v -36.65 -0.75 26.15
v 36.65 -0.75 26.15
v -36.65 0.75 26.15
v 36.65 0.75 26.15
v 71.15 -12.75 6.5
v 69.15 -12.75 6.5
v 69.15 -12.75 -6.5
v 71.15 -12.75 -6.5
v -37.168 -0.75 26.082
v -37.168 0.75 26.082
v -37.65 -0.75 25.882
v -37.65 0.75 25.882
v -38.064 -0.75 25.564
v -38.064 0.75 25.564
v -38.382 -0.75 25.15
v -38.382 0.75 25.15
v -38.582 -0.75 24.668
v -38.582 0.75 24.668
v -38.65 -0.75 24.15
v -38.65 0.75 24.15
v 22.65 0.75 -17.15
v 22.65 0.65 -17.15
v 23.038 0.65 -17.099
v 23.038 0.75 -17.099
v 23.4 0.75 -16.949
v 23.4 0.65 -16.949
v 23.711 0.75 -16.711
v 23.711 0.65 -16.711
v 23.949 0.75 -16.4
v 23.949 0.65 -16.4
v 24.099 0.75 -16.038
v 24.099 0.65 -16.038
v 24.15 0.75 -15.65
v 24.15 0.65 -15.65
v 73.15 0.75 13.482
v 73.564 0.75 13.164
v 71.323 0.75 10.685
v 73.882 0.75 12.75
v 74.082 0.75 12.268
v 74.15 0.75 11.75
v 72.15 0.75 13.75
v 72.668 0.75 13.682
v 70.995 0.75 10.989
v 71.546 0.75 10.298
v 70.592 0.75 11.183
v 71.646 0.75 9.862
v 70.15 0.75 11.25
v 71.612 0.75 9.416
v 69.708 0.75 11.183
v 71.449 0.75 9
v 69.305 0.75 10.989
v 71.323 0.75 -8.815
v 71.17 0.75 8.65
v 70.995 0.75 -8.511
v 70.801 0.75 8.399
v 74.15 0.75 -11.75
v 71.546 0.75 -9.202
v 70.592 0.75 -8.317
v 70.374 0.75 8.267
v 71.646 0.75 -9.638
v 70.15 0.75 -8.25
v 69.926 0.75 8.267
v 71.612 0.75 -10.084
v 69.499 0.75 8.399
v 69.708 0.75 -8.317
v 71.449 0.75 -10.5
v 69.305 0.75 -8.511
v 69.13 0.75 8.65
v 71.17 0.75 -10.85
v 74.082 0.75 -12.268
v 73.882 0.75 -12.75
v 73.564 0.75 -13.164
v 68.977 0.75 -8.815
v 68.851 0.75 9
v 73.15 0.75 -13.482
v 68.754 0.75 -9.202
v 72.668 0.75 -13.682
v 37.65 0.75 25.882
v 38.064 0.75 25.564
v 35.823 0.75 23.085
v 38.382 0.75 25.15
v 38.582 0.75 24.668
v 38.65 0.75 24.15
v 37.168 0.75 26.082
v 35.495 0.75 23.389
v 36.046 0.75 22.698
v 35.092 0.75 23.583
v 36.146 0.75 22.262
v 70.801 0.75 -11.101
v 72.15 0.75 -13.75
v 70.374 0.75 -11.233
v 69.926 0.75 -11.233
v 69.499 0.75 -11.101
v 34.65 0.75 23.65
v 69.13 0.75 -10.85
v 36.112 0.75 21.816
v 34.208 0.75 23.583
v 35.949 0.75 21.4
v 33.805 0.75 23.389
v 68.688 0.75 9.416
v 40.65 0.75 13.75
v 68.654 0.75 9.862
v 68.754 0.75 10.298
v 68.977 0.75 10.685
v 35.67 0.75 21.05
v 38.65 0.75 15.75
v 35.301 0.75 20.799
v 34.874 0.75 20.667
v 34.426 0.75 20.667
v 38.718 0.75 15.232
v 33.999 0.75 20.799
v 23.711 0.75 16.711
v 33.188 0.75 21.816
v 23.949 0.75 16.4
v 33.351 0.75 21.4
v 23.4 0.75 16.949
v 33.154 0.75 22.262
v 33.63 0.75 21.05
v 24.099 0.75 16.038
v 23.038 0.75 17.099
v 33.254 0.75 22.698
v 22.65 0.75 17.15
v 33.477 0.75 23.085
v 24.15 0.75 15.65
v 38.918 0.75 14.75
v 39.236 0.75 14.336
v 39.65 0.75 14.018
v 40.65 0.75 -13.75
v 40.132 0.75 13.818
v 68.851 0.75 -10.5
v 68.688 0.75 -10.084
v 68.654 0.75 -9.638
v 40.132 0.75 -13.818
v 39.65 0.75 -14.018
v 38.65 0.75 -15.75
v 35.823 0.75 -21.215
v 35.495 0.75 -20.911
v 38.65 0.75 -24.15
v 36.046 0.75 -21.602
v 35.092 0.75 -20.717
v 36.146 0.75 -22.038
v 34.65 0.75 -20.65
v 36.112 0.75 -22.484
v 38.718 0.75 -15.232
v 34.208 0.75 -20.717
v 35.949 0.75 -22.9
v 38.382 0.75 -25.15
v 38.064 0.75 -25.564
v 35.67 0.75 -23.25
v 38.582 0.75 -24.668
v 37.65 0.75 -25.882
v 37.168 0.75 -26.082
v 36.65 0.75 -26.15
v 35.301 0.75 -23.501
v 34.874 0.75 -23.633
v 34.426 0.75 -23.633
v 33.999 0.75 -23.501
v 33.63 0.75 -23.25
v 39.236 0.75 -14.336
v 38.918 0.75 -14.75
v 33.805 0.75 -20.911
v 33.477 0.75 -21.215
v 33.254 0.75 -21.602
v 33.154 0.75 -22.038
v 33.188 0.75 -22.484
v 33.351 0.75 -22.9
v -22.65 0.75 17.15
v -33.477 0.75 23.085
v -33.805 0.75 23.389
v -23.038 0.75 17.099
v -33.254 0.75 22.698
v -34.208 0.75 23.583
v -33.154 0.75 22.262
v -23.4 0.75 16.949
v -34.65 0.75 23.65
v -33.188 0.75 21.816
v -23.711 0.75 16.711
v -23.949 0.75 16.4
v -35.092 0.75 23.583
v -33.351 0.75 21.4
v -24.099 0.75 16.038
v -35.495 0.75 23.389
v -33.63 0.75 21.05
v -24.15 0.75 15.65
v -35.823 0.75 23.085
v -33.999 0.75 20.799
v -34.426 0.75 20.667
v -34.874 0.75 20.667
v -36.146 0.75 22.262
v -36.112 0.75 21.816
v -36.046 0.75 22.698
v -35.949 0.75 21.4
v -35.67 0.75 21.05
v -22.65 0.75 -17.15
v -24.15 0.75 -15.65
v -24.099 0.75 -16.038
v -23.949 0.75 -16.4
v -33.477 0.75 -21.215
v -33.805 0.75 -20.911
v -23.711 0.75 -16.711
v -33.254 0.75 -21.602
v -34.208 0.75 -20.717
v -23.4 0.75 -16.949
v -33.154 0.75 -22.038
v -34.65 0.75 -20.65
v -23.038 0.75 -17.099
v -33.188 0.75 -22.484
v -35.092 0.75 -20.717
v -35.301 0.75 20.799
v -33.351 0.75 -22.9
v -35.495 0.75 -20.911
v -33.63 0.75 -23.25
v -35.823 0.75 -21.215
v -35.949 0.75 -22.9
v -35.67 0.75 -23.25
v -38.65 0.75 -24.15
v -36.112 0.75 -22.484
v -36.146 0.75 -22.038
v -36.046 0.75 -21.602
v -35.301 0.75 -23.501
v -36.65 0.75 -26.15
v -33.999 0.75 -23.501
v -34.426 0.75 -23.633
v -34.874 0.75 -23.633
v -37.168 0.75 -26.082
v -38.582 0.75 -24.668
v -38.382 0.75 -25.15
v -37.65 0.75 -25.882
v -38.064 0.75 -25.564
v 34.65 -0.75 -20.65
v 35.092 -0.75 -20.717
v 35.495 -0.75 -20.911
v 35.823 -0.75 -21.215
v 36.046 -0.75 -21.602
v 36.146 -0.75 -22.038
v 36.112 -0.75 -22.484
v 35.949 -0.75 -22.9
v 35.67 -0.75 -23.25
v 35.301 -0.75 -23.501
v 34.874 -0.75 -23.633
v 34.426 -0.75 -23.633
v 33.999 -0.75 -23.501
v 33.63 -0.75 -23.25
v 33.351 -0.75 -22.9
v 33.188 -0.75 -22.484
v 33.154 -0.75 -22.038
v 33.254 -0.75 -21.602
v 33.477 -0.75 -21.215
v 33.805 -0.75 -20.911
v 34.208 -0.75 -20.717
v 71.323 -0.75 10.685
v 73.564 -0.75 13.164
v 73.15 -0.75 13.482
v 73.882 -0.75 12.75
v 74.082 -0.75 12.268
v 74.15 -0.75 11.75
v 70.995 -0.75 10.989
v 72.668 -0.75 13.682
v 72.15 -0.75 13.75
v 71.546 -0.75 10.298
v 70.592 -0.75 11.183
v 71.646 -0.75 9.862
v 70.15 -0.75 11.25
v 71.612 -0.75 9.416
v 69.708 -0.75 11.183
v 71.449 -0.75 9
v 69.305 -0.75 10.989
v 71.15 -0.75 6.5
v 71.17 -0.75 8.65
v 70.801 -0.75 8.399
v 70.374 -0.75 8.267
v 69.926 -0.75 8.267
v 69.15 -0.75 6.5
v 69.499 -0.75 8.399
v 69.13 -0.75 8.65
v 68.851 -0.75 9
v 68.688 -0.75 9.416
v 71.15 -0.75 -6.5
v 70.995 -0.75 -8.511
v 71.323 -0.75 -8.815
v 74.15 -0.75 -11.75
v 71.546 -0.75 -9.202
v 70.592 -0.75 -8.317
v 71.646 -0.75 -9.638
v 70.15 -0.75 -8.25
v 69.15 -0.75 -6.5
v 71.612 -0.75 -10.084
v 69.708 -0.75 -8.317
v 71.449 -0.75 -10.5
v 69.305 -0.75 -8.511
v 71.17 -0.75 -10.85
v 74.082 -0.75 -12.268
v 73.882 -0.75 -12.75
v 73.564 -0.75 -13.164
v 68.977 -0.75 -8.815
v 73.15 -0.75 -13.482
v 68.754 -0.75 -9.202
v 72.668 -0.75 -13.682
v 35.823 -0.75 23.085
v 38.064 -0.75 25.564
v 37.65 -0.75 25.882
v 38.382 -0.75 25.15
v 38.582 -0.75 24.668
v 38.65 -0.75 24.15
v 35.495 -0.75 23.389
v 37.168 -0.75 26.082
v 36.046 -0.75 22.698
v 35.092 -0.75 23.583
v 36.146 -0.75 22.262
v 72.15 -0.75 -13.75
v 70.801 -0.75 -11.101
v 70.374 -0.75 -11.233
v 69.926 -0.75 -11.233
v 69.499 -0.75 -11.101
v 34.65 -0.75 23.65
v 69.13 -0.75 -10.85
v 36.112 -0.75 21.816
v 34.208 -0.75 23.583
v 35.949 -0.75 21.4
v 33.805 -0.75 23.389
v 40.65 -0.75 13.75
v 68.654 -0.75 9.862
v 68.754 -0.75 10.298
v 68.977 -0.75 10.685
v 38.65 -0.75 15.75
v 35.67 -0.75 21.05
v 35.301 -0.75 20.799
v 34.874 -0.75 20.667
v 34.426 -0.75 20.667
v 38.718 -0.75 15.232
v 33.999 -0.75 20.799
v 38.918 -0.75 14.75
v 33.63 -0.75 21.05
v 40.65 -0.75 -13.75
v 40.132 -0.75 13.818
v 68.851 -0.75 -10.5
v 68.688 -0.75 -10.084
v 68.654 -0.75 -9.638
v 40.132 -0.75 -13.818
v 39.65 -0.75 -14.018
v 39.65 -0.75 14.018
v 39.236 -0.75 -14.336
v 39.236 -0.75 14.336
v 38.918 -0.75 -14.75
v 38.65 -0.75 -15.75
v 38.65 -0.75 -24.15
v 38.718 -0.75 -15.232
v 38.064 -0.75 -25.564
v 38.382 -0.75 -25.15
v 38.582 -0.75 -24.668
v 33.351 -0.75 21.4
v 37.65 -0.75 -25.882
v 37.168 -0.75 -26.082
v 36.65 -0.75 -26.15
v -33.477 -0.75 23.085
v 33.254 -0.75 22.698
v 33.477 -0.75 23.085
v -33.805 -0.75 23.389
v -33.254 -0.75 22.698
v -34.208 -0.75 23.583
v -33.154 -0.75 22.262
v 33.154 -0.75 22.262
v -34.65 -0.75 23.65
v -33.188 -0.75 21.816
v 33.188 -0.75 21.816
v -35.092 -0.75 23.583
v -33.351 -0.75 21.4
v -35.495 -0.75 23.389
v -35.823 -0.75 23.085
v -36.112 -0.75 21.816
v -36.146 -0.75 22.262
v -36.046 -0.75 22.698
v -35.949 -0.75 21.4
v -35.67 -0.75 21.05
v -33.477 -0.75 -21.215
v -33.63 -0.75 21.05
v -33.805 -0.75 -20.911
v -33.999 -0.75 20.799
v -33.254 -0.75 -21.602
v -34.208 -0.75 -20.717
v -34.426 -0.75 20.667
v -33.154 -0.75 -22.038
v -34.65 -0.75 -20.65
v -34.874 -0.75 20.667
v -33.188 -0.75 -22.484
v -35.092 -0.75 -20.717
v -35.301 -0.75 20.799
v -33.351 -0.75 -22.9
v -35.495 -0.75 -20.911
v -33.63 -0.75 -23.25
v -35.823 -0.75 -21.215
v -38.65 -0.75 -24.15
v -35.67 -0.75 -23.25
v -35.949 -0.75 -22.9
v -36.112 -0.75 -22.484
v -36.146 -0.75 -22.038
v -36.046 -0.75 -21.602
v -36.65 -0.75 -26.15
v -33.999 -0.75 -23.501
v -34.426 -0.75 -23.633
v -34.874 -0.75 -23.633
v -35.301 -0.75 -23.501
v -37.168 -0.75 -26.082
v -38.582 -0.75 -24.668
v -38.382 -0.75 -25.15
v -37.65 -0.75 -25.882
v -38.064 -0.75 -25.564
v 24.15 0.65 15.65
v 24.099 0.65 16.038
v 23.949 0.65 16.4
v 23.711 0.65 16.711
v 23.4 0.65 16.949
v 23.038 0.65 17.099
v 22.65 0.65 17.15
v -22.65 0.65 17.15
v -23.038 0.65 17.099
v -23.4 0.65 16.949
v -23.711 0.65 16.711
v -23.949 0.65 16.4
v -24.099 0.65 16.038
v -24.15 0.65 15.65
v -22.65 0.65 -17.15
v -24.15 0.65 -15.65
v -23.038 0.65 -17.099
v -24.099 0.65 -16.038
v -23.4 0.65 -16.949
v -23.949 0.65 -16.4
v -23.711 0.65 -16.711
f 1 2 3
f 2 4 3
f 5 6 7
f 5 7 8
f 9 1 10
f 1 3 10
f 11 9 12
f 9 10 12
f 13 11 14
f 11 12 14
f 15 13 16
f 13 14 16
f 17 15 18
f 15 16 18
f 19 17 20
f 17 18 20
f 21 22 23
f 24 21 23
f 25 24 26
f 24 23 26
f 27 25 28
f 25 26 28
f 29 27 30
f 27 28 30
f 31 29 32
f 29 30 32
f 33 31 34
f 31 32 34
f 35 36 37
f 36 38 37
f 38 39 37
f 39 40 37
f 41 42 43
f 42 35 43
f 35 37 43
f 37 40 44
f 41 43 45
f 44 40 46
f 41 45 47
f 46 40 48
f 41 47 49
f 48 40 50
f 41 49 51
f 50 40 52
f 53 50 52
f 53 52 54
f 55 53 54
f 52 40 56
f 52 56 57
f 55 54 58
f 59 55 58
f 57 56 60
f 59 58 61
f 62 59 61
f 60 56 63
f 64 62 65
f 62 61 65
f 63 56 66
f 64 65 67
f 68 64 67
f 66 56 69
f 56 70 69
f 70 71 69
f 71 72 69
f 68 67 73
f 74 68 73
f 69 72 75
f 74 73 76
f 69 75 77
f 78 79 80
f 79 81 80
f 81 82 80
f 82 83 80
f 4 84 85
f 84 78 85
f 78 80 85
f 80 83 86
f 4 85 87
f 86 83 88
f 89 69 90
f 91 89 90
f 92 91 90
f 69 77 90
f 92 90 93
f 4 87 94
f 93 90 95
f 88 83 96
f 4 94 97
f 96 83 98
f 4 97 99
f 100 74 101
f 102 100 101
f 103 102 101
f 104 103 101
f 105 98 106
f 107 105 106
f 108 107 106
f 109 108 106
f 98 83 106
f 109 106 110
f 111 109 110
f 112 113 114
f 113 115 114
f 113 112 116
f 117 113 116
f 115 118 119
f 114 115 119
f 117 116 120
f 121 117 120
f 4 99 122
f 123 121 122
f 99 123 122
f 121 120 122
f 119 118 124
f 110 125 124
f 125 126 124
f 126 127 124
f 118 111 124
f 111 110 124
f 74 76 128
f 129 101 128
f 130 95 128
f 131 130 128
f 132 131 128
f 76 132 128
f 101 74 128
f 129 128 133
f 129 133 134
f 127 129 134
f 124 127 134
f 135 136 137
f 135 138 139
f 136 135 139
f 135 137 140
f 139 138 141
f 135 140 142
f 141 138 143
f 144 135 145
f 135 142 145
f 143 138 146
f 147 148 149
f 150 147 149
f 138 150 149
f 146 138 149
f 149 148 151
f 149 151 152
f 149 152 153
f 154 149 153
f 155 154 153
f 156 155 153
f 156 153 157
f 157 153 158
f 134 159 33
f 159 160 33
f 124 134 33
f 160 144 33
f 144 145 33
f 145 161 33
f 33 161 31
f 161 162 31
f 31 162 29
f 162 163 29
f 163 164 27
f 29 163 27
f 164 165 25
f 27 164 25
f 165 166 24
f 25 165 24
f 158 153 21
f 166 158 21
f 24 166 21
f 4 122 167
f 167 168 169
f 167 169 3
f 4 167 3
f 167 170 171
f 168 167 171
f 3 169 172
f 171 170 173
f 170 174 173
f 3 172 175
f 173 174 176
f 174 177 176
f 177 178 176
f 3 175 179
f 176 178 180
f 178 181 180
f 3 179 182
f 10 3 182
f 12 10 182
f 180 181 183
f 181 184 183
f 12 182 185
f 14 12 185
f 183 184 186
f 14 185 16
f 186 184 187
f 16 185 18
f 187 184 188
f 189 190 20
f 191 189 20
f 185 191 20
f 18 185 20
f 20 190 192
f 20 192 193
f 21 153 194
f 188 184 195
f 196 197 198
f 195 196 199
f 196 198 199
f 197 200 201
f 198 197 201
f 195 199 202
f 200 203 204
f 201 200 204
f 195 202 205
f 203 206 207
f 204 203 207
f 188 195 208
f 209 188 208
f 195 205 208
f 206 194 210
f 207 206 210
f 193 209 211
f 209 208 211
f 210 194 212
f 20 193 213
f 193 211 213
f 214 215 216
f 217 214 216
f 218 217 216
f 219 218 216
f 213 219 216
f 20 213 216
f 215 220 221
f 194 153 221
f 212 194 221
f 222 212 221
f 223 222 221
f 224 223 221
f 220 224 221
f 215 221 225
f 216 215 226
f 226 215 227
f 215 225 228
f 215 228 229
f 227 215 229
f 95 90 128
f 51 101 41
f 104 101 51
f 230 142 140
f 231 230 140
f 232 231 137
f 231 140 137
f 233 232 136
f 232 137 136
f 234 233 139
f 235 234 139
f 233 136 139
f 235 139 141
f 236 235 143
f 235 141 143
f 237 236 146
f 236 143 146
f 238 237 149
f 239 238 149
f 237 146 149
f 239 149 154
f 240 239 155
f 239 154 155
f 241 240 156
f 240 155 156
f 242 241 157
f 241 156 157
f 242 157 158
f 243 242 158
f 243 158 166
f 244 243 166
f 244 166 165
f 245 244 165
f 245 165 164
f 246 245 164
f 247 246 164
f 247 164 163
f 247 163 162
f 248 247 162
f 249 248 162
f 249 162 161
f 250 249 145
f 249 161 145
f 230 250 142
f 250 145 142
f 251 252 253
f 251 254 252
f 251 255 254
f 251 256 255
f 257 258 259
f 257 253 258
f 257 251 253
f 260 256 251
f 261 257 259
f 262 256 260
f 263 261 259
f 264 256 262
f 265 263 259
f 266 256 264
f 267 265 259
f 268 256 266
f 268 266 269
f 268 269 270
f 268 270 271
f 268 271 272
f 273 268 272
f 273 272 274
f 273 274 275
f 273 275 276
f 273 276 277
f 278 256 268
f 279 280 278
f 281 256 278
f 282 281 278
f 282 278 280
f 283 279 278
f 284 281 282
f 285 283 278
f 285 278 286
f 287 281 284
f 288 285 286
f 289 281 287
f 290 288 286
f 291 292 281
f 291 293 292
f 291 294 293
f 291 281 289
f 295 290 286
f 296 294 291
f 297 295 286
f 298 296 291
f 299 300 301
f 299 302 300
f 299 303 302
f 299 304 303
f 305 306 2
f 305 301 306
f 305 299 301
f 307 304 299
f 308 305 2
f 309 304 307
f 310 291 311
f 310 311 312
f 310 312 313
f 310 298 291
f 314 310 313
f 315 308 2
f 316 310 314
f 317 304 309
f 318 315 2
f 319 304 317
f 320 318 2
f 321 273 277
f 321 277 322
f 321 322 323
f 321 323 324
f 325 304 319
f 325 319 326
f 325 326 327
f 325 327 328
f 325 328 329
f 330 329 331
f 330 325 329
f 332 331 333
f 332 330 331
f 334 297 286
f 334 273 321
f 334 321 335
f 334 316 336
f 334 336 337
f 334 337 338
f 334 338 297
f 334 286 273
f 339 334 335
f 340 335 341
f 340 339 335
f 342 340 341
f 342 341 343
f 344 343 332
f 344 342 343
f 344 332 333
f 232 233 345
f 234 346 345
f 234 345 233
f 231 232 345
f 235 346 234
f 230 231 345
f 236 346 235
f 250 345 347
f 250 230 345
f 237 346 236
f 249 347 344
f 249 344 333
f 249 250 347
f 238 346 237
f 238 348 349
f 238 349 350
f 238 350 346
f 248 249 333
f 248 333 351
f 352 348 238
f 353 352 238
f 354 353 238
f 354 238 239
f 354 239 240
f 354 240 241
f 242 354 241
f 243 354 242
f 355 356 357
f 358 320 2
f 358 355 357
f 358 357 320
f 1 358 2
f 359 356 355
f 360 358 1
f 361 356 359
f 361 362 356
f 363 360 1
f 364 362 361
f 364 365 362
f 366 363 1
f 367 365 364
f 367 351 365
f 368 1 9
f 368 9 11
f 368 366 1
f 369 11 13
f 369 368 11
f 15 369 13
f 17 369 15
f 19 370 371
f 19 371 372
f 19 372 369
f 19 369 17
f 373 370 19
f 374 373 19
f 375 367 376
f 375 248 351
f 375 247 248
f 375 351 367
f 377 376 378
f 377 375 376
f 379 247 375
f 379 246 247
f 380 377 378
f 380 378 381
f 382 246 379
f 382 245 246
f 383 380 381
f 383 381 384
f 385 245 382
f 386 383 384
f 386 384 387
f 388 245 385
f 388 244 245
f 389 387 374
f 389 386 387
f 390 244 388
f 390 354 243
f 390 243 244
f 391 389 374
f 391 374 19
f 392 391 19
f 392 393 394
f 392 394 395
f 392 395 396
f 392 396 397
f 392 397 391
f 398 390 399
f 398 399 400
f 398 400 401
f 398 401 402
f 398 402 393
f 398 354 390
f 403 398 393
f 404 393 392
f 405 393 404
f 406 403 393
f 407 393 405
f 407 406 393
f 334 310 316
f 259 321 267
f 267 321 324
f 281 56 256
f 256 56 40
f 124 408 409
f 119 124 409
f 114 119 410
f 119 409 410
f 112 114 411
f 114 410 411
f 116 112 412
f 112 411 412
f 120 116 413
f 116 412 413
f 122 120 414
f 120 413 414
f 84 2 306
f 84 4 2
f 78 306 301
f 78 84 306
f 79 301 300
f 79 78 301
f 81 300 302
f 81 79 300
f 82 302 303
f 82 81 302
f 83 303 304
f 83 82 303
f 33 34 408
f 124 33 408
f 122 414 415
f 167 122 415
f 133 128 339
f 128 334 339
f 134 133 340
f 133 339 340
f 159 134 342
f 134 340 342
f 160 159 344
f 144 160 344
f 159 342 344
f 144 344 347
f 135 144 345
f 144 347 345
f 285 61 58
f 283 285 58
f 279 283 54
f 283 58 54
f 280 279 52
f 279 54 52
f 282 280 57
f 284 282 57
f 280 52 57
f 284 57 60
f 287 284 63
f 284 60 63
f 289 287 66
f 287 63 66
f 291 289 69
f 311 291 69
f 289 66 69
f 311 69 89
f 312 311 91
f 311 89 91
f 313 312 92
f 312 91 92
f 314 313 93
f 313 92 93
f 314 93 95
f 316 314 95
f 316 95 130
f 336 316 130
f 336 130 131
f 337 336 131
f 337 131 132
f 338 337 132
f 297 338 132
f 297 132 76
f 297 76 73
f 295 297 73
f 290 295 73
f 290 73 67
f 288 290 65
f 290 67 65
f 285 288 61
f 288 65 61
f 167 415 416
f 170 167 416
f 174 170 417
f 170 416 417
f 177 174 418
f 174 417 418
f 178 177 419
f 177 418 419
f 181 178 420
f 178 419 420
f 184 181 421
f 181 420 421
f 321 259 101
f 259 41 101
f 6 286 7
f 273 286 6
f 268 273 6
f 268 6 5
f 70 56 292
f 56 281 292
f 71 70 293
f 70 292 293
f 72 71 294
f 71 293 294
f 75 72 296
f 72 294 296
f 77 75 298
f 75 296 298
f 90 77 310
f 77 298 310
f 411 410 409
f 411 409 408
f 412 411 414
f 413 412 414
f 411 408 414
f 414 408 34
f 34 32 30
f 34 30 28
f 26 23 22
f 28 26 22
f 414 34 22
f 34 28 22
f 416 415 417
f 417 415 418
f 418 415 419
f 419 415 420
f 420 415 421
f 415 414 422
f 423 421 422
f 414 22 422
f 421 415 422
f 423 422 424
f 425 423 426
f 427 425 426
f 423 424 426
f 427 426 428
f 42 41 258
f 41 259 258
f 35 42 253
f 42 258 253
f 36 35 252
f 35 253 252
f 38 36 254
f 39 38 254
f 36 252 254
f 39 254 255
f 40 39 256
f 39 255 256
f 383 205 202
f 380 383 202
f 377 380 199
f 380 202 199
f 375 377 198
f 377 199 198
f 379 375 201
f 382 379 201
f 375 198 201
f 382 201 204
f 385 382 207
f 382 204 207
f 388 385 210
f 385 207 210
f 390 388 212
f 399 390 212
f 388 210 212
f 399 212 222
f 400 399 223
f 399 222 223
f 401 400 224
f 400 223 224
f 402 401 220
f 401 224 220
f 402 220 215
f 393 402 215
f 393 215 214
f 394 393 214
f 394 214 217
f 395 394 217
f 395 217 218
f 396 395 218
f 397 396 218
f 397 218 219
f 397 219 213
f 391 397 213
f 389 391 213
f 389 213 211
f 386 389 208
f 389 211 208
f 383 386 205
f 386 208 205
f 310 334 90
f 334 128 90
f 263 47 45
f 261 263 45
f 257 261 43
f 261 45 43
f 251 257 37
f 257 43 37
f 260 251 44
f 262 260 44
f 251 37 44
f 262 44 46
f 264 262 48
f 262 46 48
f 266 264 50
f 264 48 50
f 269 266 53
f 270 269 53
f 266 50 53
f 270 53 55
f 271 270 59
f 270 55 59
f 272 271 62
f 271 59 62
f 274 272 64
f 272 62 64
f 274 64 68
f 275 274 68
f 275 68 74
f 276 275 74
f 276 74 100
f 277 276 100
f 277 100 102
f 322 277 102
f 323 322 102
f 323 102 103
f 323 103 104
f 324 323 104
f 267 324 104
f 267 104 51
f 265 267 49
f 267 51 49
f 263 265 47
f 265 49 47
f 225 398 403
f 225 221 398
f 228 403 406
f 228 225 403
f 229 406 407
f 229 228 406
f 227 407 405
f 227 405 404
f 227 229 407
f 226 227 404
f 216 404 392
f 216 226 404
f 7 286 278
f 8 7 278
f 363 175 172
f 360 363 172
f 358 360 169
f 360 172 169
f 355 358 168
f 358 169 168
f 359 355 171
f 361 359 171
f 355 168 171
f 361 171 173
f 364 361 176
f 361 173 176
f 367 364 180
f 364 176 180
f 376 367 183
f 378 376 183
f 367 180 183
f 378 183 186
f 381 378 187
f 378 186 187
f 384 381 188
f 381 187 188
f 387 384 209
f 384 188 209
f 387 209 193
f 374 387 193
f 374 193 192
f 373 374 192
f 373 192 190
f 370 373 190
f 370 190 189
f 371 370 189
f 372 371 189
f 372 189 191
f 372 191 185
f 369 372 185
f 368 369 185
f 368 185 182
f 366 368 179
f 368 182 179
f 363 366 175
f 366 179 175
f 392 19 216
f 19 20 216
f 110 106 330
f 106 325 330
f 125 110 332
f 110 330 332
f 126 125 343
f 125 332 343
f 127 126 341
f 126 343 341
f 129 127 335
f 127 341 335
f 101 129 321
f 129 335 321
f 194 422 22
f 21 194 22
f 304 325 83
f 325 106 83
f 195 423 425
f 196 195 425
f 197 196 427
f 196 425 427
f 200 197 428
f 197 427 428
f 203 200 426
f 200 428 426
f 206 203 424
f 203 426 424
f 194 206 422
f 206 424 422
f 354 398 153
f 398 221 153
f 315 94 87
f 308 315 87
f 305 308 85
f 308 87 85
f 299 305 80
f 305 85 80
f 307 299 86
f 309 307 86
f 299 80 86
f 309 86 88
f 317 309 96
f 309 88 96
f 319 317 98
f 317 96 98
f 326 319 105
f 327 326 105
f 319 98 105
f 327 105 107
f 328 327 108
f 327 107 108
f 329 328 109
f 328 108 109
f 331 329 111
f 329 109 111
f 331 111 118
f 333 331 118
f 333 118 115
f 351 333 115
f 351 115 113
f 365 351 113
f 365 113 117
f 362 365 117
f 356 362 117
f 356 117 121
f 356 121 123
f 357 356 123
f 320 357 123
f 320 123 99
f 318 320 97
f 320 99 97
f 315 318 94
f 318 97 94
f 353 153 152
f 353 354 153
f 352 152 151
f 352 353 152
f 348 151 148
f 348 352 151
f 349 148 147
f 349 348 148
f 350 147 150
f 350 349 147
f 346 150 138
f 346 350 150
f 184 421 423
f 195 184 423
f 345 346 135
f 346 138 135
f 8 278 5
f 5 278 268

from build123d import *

# Parameters (mm, degrees)
BOSS_EXTRUDE1_DEPTH     = 0.75
FILLET1_R               = 2
SKETCH2_R               = 1.5
CUT_EXTRUDE1_DEPTH      = 1.5
CUT_EXTRUDE2_DEPTH      = 0.1
CUT_EXTRUDE2_DEPTH_BACK = 0.1
SKETCH5_W               = 2
SKETCH5_H               = 13
BOSS_EXTRUDE2_DEPTH     = 12


with BuildPart() as part:
    # Sketch1 → Boss-Extrude1 (new, symmetric)
    with BuildSketch(Plane(origin=(0, 0, 0), x_dir=(1, 0, 0), z_dir=(0, 1, 0))):
        Polygon((-38.65, 26.15), (38.65, 26.15), (38.65, 13.75), (74.15, 13.75), (74.15, -13.75), (38.65, -13.75), (38.65, -26.15), (-38.65, -26.15), align=None)
    extrude(amount=BOSS_EXTRUDE1_DEPTH, both=True)

    # Fillet1
    fillet1_edges = [part.edges().sort_by_distance(p)[0] for p in [
        (38.65, 0, -13.75),
        (74.15, 0, -13.75),
        (74.15, 0, 13.75),
        (38.65, 0, 13.75),
        (38.65, 0, 26.15),
        (-38.65, 0, 26.15),
        (-38.65, 0, -26.15),
        (38.65, 0, -26.15),
    ]]
    fillet(fillet1_edges, radius=FILLET1_R)

    # Sketch2 → Cut-Extrude1 (cut)
    with BuildSketch(Plane(origin=(0, 0.75, 0), x_dir=(1, 0, 0), z_dir=(0, 1, 0))):
        with Locations(Location((-34.65, 22.15, 0), (0, 0, 270))):
            Circle(SKETCH2_R)
        with Locations(Location((34.65, 22.15, 0), (0, 0, 270))):
            Circle(SKETCH2_R)
        with Locations(Location((34.65, -22.15, 0), (0, 0, 270))):
            Circle(SKETCH2_R)
        with Locations(Location((-34.65, -22.15, 0), (0, 0, 270))):
            Circle(SKETCH2_R)
        with Locations(Location((70.15, 9.75, 0), (0, 0, 270))):
            Circle(SKETCH2_R)
        with Locations(Location((70.15, -9.75, 0), (0, 0, 270))):
            Circle(SKETCH2_R)
    extrude(amount=-CUT_EXTRUDE1_DEPTH, mode=Mode.SUBTRACT)

    # Sketch4 → Cut-Extrude2 (cut, two sides: drawn at the far end of the back side and taken through both)
    with BuildSketch(Plane(origin=(0, 0.75, 0), x_dir=(1, 0, 0), z_dir=(0, 1, 0)).offset(-CUT_EXTRUDE2_DEPTH_BACK)):
        with BuildLine():
            Line((-22.65, 17.15), (22.65, 17.15))
            ThreePointArc((22.65, 17.15), (23.710660172, 16.710660172), (24.15, 15.65))
            Line((24.15, 15.65), (24.15, -15.65))
            ThreePointArc((24.15, -15.65), (23.710660172, -16.710660172), (22.65, -17.15))
            Line((22.65, -17.15), (-22.65, -17.15))
            ThreePointArc((-22.65, -17.15), (-23.710660172, -16.710660172), (-24.15, -15.65))
            Line((-24.15, -15.65), (-24.15, 15.65))
            ThreePointArc((-24.15, 15.65), (-23.710660172, 16.710660172), (-22.65, 17.15))
        make_face()
    extrude(amount=CUT_EXTRUDE2_DEPTH + CUT_EXTRUDE2_DEPTH_BACK, mode=Mode.SUBTRACT)

    # Sketch5 → Boss-Extrude2 (add)
    with BuildSketch(Plane.XZ.offset(0.75)):
        with Locations((70.15, 0)):
            Rectangle(SKETCH5_W, SKETCH5_H)
    extrude(amount=BOSS_EXTRUDE2_DEPTH)


solid = part.part
